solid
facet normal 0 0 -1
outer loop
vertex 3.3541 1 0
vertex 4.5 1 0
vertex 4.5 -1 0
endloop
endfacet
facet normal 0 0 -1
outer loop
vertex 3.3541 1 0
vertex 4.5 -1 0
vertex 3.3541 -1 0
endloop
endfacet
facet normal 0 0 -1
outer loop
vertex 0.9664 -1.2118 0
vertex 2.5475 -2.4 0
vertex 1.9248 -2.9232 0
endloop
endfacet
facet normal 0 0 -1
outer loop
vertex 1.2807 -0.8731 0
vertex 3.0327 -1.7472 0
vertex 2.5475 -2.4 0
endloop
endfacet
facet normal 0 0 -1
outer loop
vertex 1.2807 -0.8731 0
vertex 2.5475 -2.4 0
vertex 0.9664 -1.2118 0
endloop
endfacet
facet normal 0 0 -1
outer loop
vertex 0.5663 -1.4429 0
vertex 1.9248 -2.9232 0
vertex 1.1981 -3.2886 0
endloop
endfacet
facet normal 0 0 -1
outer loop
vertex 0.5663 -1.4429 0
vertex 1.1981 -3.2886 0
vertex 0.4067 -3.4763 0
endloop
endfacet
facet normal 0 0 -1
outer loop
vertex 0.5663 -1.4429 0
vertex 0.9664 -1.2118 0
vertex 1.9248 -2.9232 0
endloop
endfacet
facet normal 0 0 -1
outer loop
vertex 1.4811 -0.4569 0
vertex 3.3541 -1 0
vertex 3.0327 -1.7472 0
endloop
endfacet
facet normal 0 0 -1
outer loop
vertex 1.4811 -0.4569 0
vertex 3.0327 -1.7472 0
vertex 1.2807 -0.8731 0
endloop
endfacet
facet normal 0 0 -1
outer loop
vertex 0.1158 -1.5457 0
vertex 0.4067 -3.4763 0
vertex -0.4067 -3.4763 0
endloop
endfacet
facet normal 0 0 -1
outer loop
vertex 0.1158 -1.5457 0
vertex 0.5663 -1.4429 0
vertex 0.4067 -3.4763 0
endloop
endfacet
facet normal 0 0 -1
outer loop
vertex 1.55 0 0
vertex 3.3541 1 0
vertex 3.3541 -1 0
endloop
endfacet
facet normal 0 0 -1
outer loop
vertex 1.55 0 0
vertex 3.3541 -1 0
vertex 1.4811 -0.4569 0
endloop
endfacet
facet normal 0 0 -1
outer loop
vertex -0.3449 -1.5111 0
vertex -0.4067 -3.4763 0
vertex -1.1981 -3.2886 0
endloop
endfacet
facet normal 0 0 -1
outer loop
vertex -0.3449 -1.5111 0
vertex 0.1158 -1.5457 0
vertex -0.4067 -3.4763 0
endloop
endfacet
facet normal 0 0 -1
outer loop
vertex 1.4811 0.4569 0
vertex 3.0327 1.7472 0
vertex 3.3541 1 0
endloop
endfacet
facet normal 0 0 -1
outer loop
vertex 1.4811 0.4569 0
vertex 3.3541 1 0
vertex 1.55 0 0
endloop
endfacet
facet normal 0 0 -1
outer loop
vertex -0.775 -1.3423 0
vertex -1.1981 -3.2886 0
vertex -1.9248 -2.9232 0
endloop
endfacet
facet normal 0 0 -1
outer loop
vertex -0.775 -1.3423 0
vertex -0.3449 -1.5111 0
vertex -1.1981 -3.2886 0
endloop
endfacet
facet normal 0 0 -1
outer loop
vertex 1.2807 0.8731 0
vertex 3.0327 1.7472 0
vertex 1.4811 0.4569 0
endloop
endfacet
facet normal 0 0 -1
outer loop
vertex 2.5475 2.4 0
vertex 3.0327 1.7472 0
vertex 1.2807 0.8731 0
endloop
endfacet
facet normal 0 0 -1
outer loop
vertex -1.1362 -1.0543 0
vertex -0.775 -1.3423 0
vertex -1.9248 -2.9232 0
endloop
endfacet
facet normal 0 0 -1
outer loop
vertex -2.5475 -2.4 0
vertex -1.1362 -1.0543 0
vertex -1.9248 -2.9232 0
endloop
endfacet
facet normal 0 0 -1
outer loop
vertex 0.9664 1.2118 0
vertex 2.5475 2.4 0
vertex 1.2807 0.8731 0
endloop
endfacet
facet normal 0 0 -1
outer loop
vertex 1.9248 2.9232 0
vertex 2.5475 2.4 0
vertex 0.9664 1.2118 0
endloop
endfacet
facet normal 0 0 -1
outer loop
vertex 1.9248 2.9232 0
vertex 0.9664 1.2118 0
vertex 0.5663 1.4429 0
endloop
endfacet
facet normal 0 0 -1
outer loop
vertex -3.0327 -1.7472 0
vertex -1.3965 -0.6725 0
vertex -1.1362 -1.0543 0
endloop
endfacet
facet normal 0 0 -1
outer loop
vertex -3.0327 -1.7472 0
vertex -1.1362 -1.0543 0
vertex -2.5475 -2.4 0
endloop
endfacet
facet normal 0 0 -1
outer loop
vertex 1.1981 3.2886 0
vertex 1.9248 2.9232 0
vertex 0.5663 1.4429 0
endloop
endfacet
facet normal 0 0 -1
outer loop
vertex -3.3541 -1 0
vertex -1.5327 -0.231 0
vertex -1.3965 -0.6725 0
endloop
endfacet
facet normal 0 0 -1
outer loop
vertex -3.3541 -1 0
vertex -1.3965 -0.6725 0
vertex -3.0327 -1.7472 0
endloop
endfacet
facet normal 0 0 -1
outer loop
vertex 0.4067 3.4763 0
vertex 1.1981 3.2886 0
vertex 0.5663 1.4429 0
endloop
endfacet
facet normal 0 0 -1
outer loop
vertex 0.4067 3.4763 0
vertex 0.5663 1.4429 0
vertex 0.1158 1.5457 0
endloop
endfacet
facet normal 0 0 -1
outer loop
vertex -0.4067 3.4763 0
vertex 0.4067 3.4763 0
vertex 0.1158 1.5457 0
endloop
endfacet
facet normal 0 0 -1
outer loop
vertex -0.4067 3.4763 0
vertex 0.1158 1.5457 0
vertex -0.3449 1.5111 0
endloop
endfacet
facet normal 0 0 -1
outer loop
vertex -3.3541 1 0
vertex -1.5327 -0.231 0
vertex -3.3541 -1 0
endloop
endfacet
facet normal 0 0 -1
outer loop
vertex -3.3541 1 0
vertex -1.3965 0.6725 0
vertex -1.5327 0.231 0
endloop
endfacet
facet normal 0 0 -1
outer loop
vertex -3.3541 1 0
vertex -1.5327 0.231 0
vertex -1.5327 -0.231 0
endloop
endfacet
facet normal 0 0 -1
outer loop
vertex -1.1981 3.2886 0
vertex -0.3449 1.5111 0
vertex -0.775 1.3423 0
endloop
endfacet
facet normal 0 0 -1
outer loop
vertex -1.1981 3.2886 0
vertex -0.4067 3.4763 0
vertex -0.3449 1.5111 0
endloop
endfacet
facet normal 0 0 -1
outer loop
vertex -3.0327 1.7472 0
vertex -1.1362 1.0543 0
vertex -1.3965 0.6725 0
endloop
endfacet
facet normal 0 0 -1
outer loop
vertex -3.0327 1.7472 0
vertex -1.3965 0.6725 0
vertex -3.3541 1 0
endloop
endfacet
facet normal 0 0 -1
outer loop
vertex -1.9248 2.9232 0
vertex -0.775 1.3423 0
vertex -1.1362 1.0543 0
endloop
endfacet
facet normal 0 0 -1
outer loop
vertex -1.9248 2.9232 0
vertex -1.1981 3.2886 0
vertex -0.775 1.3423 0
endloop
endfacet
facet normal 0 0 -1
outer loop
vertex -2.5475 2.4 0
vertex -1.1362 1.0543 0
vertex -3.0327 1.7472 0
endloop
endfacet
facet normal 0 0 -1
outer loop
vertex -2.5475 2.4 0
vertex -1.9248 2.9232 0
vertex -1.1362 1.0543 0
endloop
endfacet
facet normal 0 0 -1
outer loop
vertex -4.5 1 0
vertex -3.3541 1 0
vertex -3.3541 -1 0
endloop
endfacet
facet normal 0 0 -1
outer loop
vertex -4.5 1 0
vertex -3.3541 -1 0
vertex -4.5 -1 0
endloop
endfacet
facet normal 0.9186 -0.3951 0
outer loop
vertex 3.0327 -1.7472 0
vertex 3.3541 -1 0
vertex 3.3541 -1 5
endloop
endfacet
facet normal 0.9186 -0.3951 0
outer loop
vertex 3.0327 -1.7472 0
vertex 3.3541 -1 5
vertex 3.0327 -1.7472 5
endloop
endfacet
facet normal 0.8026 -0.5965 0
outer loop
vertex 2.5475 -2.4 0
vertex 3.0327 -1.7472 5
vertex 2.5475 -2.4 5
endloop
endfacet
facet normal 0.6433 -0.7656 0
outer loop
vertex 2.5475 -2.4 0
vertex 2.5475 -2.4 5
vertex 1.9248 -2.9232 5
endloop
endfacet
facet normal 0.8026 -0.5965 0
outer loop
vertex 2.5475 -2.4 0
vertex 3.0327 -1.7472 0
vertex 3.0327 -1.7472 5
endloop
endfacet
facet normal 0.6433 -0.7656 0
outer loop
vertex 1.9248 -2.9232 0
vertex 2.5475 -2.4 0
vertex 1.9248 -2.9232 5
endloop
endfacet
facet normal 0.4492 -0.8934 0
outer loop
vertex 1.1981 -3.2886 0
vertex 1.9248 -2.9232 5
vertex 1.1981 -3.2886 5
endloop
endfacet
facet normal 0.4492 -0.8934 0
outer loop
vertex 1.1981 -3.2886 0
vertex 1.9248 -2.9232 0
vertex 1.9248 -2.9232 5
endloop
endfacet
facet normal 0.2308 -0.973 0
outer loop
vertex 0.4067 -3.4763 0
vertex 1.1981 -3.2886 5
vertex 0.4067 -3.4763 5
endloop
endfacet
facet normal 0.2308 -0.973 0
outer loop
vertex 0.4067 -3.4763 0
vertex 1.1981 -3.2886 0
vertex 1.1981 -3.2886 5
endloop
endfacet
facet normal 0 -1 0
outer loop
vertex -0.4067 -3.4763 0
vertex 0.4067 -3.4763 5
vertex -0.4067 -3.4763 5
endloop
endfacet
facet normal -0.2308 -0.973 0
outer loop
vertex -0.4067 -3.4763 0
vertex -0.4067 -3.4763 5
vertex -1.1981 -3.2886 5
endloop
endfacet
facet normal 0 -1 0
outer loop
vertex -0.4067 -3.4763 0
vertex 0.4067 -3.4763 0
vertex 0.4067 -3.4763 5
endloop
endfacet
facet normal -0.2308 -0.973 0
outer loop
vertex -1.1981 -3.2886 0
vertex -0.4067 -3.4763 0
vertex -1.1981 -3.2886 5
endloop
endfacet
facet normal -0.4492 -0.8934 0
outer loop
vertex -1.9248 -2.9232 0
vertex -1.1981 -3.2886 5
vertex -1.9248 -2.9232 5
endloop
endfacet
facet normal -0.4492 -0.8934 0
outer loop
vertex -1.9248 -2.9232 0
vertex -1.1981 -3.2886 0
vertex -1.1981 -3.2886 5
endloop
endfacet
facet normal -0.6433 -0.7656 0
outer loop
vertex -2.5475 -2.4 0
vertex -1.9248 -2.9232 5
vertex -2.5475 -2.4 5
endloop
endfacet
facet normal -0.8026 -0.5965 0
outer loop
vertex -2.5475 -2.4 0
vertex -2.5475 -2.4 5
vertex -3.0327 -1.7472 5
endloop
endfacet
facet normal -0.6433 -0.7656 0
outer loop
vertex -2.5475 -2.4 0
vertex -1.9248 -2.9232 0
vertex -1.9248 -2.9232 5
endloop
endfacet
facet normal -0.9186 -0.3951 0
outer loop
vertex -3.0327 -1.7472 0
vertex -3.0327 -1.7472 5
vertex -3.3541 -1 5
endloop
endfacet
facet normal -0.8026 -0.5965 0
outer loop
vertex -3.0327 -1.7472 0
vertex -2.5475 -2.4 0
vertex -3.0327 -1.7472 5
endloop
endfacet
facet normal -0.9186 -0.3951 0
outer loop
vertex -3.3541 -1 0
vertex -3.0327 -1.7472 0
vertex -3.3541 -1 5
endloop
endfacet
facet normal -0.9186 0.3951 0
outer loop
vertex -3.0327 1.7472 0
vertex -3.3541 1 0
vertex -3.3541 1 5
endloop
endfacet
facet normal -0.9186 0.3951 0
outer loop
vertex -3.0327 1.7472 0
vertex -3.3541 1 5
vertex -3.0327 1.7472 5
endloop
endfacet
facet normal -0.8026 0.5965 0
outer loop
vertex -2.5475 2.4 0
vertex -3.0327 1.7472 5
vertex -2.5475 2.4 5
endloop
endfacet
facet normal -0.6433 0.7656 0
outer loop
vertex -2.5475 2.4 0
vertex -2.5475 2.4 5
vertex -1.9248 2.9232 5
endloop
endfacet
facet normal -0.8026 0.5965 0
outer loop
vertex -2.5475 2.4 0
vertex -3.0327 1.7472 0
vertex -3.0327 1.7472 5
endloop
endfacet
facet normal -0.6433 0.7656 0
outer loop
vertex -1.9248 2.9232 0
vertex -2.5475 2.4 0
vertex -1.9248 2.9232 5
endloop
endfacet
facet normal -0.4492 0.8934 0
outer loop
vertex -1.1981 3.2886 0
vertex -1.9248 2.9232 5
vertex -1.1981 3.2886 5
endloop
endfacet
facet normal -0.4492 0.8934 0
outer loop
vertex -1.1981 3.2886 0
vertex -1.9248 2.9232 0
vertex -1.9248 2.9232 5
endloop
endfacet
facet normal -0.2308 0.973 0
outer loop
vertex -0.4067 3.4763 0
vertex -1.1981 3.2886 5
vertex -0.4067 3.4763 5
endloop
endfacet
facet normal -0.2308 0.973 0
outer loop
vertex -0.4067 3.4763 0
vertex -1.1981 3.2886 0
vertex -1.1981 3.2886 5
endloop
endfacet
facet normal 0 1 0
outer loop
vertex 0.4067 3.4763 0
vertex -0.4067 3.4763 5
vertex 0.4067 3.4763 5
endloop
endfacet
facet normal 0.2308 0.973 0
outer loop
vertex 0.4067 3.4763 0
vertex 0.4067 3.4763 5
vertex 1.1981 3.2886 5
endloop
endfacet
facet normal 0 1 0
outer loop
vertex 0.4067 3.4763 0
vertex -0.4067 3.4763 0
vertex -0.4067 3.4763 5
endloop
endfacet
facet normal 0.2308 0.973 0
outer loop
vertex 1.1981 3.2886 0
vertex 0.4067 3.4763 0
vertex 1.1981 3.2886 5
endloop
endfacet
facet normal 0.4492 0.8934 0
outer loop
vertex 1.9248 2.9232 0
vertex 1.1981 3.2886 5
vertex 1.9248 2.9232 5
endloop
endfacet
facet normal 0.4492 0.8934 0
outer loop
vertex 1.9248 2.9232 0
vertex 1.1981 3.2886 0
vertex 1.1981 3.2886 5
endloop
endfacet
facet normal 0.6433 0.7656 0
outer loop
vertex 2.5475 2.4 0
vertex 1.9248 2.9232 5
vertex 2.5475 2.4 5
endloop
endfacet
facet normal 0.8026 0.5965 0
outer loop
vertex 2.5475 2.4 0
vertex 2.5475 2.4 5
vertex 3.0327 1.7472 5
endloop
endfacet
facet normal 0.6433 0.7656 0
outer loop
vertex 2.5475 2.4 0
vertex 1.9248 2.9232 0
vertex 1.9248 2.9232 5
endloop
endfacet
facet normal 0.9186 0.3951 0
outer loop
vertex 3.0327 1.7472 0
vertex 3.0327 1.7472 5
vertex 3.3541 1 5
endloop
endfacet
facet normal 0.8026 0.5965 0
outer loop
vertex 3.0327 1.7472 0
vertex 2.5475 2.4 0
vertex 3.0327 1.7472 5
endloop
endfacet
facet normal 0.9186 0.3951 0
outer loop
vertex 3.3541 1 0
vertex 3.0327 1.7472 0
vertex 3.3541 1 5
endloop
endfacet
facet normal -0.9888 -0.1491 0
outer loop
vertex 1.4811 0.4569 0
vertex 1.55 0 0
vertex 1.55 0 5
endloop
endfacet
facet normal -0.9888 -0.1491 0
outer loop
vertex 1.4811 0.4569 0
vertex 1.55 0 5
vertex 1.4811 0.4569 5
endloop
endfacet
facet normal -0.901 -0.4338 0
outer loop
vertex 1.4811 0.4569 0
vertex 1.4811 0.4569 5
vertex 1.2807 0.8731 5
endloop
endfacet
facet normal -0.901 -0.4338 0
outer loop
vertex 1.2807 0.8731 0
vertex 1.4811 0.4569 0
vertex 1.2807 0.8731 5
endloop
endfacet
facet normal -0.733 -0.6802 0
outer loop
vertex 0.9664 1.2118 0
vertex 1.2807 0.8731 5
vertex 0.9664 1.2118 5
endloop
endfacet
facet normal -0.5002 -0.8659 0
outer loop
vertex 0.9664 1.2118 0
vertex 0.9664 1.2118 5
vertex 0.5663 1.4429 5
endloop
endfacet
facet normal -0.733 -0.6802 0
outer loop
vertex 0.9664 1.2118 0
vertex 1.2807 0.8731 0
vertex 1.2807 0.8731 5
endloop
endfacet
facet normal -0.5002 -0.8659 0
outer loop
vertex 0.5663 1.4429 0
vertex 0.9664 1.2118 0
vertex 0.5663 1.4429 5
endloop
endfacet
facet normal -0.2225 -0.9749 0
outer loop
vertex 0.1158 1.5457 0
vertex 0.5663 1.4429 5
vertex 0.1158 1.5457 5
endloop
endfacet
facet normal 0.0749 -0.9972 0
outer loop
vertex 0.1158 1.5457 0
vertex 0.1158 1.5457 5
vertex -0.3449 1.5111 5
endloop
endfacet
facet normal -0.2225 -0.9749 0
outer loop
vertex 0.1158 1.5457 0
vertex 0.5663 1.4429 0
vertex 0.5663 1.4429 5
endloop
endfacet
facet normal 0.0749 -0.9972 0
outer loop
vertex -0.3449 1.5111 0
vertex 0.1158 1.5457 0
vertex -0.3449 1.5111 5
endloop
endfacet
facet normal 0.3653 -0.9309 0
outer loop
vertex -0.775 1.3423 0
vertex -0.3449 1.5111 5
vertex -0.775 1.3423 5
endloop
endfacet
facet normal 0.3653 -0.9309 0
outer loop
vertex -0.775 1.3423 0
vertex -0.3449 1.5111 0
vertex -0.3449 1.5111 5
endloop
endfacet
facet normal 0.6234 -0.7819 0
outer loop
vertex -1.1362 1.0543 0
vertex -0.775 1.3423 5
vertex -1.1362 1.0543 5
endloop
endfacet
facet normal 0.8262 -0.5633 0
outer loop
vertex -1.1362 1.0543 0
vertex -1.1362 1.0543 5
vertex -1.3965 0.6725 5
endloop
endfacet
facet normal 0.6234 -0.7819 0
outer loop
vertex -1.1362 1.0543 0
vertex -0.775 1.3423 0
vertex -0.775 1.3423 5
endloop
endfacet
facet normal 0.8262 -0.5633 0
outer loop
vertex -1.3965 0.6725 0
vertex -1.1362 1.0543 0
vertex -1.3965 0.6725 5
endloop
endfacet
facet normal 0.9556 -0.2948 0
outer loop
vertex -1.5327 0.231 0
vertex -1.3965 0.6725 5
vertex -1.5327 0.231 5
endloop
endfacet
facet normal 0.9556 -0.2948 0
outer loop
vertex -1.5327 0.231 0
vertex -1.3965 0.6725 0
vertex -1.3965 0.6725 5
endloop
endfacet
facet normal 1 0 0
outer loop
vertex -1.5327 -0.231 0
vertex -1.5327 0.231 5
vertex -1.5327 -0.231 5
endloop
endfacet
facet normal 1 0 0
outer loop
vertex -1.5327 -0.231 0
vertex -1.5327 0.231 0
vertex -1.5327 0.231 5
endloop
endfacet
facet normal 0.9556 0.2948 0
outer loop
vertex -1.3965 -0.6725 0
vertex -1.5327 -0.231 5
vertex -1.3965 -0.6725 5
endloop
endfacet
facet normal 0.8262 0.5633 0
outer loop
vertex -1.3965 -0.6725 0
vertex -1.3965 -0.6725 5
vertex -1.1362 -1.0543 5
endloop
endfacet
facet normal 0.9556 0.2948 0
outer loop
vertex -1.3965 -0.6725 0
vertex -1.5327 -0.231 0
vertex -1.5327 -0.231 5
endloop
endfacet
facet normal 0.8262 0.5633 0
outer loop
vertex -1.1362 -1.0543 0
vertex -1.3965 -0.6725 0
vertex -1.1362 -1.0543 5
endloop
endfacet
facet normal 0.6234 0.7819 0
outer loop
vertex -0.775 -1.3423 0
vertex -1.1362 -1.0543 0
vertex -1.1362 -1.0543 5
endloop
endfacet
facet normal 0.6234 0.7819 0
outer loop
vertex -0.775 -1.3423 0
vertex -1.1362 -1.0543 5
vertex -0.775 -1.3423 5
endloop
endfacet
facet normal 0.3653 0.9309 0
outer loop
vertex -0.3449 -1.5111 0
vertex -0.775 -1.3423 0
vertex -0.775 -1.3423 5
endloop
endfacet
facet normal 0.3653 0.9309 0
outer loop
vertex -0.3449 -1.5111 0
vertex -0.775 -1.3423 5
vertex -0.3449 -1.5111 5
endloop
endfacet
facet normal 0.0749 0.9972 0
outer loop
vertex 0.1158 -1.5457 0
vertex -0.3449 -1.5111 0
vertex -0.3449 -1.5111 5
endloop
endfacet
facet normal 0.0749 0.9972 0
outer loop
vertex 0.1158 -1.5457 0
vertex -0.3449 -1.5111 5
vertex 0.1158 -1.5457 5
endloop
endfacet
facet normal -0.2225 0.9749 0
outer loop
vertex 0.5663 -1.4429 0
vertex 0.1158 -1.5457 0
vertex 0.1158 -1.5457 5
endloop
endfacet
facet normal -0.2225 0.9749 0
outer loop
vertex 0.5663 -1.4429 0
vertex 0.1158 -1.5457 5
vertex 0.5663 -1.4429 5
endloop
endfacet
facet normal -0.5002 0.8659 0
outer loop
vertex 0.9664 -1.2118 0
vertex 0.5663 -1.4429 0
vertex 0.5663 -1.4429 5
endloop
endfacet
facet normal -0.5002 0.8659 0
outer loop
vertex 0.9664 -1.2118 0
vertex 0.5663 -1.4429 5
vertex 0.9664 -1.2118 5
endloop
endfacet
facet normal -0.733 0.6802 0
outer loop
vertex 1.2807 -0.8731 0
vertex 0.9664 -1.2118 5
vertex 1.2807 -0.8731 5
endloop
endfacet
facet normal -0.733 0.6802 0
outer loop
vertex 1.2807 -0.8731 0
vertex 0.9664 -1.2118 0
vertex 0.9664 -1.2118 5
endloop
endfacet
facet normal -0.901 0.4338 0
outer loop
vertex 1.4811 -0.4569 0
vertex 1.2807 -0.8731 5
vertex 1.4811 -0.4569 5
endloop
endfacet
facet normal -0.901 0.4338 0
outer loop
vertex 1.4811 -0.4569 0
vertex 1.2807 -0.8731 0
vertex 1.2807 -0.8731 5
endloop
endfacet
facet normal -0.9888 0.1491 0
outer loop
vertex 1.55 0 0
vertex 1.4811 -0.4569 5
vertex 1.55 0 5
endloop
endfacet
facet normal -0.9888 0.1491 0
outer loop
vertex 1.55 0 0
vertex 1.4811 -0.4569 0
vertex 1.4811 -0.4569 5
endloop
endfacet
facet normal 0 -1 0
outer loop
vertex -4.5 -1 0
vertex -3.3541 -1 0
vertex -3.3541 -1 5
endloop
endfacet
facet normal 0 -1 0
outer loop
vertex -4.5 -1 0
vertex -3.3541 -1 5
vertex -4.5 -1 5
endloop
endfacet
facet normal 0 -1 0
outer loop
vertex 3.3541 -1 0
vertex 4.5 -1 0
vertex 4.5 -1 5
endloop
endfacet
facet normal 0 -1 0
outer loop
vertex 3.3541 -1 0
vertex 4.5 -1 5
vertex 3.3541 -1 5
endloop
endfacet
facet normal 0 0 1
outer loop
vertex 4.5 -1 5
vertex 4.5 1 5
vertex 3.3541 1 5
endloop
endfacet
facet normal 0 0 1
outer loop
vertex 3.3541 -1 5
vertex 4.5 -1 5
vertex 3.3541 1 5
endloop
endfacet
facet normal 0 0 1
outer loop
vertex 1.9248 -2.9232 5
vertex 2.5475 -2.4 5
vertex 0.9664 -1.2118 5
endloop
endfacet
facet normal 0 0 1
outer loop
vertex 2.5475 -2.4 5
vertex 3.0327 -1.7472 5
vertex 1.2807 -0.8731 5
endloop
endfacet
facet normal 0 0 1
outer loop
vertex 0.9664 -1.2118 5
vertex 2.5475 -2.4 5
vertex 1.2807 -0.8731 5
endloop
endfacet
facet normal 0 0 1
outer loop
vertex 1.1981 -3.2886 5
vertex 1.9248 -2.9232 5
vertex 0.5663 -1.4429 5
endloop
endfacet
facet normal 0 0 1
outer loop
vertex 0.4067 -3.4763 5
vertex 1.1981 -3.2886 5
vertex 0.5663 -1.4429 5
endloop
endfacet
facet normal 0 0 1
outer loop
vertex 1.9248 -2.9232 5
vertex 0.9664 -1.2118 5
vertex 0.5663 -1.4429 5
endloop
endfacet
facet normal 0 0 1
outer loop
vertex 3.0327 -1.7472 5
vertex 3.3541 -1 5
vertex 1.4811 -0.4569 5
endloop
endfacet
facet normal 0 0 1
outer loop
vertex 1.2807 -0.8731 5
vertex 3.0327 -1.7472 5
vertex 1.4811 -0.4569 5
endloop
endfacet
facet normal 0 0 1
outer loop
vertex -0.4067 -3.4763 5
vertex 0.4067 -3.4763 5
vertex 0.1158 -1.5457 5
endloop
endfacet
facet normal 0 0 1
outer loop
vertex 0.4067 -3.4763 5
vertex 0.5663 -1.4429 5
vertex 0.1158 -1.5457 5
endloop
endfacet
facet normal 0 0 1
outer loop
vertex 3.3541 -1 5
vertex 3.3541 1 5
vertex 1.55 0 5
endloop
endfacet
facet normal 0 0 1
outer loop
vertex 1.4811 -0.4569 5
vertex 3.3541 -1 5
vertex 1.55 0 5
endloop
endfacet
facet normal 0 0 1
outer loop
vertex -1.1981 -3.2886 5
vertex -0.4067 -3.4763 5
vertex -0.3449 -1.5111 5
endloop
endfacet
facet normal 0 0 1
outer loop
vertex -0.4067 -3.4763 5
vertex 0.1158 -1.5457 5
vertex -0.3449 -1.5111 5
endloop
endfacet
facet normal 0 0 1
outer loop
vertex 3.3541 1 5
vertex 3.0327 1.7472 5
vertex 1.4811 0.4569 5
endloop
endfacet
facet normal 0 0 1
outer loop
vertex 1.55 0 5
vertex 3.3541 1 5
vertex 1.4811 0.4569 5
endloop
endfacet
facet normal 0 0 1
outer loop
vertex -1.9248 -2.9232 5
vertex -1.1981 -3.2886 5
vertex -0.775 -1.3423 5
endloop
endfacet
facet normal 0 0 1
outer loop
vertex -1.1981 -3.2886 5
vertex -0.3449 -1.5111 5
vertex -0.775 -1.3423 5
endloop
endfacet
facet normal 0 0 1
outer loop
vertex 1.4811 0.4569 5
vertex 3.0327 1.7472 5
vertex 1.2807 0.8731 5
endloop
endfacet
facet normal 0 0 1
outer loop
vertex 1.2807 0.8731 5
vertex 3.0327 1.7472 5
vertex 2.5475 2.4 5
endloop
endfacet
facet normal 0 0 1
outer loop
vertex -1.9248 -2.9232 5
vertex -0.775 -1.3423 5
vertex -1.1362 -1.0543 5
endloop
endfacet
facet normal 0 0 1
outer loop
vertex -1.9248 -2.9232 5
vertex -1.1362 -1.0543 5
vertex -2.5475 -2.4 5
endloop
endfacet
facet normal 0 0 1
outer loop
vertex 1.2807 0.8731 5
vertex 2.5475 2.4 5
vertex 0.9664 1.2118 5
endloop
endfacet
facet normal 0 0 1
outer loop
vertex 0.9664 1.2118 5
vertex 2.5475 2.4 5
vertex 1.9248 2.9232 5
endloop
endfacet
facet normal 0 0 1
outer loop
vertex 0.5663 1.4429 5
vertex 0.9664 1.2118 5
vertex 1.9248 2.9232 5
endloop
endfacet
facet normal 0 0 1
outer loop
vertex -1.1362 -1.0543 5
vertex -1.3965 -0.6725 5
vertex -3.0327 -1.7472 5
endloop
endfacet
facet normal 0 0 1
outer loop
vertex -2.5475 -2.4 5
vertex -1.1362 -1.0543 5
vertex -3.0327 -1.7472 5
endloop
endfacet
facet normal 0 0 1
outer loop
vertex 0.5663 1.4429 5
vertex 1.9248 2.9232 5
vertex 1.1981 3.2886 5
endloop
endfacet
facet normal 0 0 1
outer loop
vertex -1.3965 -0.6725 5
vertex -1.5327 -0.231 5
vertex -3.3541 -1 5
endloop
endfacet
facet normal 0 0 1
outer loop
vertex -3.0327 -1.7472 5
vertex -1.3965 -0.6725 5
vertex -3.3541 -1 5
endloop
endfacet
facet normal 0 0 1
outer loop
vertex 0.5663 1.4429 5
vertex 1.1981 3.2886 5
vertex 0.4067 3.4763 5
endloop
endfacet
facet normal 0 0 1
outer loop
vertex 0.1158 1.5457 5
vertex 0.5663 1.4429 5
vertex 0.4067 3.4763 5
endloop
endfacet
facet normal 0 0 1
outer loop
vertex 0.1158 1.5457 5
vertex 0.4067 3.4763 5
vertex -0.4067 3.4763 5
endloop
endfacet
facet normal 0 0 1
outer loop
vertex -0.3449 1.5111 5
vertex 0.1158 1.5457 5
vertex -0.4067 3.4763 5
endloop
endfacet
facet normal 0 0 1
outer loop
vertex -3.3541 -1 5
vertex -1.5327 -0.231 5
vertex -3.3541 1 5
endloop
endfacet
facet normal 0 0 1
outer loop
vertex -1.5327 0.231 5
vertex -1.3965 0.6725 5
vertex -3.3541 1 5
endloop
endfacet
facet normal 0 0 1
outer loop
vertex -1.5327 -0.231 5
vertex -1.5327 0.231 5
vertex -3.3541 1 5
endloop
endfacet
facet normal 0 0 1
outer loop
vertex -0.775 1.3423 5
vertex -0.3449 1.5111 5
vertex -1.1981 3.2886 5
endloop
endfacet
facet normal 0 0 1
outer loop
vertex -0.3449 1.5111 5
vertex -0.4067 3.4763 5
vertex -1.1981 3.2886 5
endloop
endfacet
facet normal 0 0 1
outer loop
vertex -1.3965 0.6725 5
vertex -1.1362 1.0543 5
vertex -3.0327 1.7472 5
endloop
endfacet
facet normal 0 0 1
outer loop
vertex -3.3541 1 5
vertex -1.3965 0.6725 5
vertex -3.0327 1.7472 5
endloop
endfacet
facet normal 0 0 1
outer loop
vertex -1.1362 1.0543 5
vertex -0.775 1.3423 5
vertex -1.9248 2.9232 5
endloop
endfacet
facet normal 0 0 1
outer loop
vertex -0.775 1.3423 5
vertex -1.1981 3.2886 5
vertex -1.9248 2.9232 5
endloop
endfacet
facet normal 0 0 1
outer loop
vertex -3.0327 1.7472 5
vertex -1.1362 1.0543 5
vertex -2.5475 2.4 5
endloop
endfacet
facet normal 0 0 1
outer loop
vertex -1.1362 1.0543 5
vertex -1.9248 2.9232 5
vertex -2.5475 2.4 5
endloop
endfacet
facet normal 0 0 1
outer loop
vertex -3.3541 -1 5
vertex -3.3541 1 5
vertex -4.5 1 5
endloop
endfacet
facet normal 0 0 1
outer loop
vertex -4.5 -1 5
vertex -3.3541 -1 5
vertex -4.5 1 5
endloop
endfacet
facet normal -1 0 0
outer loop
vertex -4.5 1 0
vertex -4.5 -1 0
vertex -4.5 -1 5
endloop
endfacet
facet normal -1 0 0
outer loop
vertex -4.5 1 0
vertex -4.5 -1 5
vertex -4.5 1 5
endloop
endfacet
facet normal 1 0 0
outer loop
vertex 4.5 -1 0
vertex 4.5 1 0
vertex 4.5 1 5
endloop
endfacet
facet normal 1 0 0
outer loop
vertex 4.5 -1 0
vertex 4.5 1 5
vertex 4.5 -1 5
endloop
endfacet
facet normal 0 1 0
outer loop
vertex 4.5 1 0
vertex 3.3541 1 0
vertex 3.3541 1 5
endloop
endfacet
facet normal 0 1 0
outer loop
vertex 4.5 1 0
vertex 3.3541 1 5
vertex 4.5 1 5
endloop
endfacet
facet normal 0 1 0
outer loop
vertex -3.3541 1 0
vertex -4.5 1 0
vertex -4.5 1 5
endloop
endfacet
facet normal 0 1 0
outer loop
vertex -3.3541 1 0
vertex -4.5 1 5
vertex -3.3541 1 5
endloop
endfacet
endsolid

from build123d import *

# Parameters (mm, degrees)
SKETCH_1_R      = 1.55
EXTRUDE_1_DEPTH = 5


with BuildPart() as part:
    # 草圖1 → 填料-伸長1 (new body)
    with BuildSketch(Plane.XY):
        with BuildLine():
            Line((-4.5, 1), (-3.354101966, 1))
            ThreePointArc((-3.354101966, 1), (0, 3.5), (3.354101966, 1))
            Line((3.354101966, 1), (4.5, 1))
            Line((4.5, 1), (4.5, -1))
            Line((4.5, -1), (3.354101966, -1))
            ThreePointArc((3.354101966, -1), (0, -3.5), (-3.354101966, -1))
            Line((-3.354101966, -1), (-4.5, -1))
            Line((-4.5, -1), (-4.5, 1))
        make_face()
        Circle(SKETCH_1_R, mode=Mode.SUBTRACT)
    extrude(amount=EXTRUDE_1_DEPTH)


solid = part.part
